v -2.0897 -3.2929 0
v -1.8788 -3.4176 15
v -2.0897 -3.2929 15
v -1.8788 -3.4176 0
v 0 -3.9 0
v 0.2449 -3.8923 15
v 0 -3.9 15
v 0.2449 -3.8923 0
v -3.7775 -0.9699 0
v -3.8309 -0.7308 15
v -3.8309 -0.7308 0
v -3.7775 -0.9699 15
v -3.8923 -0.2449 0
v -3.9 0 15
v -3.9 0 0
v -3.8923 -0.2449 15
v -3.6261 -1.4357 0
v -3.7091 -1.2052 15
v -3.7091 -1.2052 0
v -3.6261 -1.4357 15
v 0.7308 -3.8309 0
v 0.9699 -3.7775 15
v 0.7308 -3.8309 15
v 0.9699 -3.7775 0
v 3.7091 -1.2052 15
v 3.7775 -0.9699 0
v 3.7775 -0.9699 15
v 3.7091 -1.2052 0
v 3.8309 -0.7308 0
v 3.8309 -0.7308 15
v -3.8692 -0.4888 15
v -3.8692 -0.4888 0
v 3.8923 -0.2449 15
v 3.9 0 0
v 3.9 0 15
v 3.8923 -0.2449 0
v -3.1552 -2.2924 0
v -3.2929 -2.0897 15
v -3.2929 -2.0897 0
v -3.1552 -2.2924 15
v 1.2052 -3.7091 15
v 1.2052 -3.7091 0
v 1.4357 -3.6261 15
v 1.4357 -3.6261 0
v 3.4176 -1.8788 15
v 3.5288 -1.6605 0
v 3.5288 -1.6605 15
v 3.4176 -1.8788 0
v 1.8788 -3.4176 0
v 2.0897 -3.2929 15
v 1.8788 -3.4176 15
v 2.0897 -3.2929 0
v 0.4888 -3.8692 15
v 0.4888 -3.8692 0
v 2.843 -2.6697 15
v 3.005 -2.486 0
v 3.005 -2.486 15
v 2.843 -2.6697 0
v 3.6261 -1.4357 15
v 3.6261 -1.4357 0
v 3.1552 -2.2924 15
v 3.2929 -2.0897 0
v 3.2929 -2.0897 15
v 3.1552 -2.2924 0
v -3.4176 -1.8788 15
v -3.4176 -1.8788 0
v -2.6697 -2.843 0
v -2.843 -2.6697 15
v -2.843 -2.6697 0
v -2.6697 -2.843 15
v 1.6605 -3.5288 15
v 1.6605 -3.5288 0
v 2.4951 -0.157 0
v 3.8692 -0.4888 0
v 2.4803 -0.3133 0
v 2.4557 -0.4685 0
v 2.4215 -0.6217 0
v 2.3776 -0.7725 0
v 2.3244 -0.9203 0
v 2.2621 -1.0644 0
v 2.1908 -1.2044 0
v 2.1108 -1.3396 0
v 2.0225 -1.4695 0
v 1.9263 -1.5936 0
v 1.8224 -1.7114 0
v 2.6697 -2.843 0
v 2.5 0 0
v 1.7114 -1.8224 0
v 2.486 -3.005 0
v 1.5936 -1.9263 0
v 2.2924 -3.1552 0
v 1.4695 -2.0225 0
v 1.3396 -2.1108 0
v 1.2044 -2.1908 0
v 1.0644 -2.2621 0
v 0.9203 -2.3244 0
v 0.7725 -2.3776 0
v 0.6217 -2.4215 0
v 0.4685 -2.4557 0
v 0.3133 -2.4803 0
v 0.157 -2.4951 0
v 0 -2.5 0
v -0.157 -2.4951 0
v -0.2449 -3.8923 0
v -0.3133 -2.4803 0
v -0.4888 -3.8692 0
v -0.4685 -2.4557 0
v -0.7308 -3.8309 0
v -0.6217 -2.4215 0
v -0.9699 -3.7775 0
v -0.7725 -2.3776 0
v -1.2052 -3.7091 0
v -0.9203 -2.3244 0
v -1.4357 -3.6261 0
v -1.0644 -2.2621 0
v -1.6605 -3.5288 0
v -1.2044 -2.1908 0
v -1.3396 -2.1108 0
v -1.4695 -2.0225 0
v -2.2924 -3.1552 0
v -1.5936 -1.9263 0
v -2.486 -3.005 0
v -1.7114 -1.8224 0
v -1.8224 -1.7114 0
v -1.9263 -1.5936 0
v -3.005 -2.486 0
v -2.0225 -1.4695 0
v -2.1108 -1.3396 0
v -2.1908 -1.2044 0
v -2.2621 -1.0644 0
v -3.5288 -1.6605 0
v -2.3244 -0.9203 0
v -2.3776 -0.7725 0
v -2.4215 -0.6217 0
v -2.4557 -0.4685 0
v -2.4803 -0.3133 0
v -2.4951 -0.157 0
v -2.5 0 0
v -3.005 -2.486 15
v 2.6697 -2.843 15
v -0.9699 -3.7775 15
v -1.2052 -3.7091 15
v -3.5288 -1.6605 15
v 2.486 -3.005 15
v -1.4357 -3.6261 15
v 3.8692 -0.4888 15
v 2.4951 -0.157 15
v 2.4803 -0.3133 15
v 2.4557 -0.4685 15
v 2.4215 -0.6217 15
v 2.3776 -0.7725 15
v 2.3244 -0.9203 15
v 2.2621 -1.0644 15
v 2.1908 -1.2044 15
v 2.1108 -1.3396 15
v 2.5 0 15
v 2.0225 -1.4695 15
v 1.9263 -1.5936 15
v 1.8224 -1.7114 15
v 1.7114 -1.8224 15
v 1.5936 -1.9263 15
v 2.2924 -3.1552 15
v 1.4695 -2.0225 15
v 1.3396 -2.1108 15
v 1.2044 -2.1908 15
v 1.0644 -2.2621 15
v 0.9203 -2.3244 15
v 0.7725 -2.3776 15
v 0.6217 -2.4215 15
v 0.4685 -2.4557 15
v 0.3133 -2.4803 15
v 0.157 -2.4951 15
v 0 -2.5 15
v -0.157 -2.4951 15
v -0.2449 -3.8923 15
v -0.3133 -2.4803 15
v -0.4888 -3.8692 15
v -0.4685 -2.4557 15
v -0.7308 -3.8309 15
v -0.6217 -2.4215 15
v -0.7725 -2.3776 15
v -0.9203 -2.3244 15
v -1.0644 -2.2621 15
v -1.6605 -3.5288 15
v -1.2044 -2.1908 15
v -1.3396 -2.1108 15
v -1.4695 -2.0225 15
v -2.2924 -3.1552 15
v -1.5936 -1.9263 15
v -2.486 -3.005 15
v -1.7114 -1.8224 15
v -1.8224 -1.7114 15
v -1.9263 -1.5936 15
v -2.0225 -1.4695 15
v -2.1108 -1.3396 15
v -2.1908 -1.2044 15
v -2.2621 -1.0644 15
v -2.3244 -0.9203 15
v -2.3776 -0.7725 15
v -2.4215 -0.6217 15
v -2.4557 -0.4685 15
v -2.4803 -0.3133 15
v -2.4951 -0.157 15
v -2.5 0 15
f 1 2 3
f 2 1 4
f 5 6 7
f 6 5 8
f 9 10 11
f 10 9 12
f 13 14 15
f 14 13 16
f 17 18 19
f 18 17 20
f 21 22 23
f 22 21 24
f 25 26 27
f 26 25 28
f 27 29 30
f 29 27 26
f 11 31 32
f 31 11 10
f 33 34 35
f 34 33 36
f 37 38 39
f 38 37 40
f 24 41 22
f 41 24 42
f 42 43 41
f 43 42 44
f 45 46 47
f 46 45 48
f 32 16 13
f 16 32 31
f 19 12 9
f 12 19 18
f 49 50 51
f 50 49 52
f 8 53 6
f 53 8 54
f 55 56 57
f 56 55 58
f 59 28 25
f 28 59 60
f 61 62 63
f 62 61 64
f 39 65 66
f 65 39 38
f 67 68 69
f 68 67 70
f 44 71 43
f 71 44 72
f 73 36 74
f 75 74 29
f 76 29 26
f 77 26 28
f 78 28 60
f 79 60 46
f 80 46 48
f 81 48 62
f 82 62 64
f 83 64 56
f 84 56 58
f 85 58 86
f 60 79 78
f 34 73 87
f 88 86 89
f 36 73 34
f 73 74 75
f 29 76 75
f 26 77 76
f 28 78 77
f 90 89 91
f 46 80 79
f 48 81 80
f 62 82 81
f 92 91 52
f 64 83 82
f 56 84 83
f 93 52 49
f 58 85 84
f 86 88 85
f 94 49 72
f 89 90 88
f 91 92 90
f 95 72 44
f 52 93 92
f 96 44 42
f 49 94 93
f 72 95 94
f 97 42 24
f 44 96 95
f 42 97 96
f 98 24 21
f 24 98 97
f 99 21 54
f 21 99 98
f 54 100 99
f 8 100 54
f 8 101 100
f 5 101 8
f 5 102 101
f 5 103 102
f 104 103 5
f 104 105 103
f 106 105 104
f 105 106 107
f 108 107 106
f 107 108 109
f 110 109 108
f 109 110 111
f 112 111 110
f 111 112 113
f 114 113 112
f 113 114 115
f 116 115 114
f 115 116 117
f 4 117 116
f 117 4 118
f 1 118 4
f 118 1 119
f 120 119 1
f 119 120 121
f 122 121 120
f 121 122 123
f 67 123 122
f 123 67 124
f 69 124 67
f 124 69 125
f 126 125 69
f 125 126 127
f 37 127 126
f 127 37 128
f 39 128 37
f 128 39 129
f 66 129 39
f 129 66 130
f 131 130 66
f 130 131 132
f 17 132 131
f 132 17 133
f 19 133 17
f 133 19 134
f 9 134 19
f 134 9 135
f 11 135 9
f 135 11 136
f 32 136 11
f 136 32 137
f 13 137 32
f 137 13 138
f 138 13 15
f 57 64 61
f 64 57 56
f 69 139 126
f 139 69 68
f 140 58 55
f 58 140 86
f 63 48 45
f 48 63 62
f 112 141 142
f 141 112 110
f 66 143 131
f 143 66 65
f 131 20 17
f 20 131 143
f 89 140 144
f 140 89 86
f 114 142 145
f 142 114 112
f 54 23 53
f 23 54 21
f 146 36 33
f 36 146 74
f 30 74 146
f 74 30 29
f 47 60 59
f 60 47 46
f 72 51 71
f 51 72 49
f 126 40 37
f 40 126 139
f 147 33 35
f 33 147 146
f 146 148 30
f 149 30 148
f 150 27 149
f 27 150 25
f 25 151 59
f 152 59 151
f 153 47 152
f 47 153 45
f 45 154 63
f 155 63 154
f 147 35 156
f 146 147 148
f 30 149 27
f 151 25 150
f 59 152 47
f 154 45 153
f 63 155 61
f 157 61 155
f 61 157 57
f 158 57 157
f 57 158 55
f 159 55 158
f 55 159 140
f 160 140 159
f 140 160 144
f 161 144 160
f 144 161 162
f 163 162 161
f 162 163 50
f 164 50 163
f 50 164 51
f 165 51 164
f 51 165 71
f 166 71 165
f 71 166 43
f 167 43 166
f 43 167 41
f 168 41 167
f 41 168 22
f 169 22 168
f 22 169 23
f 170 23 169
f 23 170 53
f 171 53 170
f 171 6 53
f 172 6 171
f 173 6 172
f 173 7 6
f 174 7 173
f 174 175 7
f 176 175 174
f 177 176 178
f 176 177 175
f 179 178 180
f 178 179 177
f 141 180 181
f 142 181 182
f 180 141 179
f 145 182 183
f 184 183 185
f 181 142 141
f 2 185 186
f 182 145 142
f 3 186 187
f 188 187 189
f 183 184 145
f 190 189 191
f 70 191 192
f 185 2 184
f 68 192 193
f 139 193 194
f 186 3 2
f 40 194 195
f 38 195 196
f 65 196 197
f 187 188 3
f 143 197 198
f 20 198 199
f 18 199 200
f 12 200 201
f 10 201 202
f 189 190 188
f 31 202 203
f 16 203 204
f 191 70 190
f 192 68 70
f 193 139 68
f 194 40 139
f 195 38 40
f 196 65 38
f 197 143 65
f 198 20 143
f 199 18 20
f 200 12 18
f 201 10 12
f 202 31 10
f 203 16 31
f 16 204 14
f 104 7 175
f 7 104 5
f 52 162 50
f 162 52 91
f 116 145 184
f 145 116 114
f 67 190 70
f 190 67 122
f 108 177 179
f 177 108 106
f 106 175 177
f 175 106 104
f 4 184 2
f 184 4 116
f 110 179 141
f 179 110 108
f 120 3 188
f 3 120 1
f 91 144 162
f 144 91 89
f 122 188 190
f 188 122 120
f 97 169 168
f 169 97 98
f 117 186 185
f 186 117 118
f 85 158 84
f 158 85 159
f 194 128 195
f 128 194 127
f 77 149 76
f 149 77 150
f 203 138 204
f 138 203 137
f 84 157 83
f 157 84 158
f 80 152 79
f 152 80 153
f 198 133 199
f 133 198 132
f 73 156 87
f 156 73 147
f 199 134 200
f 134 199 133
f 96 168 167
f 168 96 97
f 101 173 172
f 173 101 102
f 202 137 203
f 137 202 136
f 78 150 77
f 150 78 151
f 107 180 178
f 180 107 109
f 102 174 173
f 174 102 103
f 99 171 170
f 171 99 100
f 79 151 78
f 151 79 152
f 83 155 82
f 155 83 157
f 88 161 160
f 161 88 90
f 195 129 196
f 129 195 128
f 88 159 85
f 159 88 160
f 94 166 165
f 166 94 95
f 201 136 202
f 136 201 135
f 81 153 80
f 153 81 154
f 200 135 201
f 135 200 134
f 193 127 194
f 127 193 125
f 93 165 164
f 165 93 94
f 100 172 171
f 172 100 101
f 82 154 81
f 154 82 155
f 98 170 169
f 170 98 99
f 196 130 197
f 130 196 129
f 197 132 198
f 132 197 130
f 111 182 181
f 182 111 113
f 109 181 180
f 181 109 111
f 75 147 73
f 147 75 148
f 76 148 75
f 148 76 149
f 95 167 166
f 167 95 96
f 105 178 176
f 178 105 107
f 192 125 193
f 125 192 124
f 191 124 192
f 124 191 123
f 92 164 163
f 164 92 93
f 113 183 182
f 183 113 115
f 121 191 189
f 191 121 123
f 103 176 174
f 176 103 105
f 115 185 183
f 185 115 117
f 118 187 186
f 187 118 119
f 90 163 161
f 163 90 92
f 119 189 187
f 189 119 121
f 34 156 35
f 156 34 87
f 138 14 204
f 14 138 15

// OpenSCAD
$fn=100;
difference(){
  difference(){
    cylinder(h=15,d=7.8);
    cylinder(h=15,d=5);
  }

  #translate([0,7.8/2,17/2])cube([7.8,7.8,20],center=true);

}
